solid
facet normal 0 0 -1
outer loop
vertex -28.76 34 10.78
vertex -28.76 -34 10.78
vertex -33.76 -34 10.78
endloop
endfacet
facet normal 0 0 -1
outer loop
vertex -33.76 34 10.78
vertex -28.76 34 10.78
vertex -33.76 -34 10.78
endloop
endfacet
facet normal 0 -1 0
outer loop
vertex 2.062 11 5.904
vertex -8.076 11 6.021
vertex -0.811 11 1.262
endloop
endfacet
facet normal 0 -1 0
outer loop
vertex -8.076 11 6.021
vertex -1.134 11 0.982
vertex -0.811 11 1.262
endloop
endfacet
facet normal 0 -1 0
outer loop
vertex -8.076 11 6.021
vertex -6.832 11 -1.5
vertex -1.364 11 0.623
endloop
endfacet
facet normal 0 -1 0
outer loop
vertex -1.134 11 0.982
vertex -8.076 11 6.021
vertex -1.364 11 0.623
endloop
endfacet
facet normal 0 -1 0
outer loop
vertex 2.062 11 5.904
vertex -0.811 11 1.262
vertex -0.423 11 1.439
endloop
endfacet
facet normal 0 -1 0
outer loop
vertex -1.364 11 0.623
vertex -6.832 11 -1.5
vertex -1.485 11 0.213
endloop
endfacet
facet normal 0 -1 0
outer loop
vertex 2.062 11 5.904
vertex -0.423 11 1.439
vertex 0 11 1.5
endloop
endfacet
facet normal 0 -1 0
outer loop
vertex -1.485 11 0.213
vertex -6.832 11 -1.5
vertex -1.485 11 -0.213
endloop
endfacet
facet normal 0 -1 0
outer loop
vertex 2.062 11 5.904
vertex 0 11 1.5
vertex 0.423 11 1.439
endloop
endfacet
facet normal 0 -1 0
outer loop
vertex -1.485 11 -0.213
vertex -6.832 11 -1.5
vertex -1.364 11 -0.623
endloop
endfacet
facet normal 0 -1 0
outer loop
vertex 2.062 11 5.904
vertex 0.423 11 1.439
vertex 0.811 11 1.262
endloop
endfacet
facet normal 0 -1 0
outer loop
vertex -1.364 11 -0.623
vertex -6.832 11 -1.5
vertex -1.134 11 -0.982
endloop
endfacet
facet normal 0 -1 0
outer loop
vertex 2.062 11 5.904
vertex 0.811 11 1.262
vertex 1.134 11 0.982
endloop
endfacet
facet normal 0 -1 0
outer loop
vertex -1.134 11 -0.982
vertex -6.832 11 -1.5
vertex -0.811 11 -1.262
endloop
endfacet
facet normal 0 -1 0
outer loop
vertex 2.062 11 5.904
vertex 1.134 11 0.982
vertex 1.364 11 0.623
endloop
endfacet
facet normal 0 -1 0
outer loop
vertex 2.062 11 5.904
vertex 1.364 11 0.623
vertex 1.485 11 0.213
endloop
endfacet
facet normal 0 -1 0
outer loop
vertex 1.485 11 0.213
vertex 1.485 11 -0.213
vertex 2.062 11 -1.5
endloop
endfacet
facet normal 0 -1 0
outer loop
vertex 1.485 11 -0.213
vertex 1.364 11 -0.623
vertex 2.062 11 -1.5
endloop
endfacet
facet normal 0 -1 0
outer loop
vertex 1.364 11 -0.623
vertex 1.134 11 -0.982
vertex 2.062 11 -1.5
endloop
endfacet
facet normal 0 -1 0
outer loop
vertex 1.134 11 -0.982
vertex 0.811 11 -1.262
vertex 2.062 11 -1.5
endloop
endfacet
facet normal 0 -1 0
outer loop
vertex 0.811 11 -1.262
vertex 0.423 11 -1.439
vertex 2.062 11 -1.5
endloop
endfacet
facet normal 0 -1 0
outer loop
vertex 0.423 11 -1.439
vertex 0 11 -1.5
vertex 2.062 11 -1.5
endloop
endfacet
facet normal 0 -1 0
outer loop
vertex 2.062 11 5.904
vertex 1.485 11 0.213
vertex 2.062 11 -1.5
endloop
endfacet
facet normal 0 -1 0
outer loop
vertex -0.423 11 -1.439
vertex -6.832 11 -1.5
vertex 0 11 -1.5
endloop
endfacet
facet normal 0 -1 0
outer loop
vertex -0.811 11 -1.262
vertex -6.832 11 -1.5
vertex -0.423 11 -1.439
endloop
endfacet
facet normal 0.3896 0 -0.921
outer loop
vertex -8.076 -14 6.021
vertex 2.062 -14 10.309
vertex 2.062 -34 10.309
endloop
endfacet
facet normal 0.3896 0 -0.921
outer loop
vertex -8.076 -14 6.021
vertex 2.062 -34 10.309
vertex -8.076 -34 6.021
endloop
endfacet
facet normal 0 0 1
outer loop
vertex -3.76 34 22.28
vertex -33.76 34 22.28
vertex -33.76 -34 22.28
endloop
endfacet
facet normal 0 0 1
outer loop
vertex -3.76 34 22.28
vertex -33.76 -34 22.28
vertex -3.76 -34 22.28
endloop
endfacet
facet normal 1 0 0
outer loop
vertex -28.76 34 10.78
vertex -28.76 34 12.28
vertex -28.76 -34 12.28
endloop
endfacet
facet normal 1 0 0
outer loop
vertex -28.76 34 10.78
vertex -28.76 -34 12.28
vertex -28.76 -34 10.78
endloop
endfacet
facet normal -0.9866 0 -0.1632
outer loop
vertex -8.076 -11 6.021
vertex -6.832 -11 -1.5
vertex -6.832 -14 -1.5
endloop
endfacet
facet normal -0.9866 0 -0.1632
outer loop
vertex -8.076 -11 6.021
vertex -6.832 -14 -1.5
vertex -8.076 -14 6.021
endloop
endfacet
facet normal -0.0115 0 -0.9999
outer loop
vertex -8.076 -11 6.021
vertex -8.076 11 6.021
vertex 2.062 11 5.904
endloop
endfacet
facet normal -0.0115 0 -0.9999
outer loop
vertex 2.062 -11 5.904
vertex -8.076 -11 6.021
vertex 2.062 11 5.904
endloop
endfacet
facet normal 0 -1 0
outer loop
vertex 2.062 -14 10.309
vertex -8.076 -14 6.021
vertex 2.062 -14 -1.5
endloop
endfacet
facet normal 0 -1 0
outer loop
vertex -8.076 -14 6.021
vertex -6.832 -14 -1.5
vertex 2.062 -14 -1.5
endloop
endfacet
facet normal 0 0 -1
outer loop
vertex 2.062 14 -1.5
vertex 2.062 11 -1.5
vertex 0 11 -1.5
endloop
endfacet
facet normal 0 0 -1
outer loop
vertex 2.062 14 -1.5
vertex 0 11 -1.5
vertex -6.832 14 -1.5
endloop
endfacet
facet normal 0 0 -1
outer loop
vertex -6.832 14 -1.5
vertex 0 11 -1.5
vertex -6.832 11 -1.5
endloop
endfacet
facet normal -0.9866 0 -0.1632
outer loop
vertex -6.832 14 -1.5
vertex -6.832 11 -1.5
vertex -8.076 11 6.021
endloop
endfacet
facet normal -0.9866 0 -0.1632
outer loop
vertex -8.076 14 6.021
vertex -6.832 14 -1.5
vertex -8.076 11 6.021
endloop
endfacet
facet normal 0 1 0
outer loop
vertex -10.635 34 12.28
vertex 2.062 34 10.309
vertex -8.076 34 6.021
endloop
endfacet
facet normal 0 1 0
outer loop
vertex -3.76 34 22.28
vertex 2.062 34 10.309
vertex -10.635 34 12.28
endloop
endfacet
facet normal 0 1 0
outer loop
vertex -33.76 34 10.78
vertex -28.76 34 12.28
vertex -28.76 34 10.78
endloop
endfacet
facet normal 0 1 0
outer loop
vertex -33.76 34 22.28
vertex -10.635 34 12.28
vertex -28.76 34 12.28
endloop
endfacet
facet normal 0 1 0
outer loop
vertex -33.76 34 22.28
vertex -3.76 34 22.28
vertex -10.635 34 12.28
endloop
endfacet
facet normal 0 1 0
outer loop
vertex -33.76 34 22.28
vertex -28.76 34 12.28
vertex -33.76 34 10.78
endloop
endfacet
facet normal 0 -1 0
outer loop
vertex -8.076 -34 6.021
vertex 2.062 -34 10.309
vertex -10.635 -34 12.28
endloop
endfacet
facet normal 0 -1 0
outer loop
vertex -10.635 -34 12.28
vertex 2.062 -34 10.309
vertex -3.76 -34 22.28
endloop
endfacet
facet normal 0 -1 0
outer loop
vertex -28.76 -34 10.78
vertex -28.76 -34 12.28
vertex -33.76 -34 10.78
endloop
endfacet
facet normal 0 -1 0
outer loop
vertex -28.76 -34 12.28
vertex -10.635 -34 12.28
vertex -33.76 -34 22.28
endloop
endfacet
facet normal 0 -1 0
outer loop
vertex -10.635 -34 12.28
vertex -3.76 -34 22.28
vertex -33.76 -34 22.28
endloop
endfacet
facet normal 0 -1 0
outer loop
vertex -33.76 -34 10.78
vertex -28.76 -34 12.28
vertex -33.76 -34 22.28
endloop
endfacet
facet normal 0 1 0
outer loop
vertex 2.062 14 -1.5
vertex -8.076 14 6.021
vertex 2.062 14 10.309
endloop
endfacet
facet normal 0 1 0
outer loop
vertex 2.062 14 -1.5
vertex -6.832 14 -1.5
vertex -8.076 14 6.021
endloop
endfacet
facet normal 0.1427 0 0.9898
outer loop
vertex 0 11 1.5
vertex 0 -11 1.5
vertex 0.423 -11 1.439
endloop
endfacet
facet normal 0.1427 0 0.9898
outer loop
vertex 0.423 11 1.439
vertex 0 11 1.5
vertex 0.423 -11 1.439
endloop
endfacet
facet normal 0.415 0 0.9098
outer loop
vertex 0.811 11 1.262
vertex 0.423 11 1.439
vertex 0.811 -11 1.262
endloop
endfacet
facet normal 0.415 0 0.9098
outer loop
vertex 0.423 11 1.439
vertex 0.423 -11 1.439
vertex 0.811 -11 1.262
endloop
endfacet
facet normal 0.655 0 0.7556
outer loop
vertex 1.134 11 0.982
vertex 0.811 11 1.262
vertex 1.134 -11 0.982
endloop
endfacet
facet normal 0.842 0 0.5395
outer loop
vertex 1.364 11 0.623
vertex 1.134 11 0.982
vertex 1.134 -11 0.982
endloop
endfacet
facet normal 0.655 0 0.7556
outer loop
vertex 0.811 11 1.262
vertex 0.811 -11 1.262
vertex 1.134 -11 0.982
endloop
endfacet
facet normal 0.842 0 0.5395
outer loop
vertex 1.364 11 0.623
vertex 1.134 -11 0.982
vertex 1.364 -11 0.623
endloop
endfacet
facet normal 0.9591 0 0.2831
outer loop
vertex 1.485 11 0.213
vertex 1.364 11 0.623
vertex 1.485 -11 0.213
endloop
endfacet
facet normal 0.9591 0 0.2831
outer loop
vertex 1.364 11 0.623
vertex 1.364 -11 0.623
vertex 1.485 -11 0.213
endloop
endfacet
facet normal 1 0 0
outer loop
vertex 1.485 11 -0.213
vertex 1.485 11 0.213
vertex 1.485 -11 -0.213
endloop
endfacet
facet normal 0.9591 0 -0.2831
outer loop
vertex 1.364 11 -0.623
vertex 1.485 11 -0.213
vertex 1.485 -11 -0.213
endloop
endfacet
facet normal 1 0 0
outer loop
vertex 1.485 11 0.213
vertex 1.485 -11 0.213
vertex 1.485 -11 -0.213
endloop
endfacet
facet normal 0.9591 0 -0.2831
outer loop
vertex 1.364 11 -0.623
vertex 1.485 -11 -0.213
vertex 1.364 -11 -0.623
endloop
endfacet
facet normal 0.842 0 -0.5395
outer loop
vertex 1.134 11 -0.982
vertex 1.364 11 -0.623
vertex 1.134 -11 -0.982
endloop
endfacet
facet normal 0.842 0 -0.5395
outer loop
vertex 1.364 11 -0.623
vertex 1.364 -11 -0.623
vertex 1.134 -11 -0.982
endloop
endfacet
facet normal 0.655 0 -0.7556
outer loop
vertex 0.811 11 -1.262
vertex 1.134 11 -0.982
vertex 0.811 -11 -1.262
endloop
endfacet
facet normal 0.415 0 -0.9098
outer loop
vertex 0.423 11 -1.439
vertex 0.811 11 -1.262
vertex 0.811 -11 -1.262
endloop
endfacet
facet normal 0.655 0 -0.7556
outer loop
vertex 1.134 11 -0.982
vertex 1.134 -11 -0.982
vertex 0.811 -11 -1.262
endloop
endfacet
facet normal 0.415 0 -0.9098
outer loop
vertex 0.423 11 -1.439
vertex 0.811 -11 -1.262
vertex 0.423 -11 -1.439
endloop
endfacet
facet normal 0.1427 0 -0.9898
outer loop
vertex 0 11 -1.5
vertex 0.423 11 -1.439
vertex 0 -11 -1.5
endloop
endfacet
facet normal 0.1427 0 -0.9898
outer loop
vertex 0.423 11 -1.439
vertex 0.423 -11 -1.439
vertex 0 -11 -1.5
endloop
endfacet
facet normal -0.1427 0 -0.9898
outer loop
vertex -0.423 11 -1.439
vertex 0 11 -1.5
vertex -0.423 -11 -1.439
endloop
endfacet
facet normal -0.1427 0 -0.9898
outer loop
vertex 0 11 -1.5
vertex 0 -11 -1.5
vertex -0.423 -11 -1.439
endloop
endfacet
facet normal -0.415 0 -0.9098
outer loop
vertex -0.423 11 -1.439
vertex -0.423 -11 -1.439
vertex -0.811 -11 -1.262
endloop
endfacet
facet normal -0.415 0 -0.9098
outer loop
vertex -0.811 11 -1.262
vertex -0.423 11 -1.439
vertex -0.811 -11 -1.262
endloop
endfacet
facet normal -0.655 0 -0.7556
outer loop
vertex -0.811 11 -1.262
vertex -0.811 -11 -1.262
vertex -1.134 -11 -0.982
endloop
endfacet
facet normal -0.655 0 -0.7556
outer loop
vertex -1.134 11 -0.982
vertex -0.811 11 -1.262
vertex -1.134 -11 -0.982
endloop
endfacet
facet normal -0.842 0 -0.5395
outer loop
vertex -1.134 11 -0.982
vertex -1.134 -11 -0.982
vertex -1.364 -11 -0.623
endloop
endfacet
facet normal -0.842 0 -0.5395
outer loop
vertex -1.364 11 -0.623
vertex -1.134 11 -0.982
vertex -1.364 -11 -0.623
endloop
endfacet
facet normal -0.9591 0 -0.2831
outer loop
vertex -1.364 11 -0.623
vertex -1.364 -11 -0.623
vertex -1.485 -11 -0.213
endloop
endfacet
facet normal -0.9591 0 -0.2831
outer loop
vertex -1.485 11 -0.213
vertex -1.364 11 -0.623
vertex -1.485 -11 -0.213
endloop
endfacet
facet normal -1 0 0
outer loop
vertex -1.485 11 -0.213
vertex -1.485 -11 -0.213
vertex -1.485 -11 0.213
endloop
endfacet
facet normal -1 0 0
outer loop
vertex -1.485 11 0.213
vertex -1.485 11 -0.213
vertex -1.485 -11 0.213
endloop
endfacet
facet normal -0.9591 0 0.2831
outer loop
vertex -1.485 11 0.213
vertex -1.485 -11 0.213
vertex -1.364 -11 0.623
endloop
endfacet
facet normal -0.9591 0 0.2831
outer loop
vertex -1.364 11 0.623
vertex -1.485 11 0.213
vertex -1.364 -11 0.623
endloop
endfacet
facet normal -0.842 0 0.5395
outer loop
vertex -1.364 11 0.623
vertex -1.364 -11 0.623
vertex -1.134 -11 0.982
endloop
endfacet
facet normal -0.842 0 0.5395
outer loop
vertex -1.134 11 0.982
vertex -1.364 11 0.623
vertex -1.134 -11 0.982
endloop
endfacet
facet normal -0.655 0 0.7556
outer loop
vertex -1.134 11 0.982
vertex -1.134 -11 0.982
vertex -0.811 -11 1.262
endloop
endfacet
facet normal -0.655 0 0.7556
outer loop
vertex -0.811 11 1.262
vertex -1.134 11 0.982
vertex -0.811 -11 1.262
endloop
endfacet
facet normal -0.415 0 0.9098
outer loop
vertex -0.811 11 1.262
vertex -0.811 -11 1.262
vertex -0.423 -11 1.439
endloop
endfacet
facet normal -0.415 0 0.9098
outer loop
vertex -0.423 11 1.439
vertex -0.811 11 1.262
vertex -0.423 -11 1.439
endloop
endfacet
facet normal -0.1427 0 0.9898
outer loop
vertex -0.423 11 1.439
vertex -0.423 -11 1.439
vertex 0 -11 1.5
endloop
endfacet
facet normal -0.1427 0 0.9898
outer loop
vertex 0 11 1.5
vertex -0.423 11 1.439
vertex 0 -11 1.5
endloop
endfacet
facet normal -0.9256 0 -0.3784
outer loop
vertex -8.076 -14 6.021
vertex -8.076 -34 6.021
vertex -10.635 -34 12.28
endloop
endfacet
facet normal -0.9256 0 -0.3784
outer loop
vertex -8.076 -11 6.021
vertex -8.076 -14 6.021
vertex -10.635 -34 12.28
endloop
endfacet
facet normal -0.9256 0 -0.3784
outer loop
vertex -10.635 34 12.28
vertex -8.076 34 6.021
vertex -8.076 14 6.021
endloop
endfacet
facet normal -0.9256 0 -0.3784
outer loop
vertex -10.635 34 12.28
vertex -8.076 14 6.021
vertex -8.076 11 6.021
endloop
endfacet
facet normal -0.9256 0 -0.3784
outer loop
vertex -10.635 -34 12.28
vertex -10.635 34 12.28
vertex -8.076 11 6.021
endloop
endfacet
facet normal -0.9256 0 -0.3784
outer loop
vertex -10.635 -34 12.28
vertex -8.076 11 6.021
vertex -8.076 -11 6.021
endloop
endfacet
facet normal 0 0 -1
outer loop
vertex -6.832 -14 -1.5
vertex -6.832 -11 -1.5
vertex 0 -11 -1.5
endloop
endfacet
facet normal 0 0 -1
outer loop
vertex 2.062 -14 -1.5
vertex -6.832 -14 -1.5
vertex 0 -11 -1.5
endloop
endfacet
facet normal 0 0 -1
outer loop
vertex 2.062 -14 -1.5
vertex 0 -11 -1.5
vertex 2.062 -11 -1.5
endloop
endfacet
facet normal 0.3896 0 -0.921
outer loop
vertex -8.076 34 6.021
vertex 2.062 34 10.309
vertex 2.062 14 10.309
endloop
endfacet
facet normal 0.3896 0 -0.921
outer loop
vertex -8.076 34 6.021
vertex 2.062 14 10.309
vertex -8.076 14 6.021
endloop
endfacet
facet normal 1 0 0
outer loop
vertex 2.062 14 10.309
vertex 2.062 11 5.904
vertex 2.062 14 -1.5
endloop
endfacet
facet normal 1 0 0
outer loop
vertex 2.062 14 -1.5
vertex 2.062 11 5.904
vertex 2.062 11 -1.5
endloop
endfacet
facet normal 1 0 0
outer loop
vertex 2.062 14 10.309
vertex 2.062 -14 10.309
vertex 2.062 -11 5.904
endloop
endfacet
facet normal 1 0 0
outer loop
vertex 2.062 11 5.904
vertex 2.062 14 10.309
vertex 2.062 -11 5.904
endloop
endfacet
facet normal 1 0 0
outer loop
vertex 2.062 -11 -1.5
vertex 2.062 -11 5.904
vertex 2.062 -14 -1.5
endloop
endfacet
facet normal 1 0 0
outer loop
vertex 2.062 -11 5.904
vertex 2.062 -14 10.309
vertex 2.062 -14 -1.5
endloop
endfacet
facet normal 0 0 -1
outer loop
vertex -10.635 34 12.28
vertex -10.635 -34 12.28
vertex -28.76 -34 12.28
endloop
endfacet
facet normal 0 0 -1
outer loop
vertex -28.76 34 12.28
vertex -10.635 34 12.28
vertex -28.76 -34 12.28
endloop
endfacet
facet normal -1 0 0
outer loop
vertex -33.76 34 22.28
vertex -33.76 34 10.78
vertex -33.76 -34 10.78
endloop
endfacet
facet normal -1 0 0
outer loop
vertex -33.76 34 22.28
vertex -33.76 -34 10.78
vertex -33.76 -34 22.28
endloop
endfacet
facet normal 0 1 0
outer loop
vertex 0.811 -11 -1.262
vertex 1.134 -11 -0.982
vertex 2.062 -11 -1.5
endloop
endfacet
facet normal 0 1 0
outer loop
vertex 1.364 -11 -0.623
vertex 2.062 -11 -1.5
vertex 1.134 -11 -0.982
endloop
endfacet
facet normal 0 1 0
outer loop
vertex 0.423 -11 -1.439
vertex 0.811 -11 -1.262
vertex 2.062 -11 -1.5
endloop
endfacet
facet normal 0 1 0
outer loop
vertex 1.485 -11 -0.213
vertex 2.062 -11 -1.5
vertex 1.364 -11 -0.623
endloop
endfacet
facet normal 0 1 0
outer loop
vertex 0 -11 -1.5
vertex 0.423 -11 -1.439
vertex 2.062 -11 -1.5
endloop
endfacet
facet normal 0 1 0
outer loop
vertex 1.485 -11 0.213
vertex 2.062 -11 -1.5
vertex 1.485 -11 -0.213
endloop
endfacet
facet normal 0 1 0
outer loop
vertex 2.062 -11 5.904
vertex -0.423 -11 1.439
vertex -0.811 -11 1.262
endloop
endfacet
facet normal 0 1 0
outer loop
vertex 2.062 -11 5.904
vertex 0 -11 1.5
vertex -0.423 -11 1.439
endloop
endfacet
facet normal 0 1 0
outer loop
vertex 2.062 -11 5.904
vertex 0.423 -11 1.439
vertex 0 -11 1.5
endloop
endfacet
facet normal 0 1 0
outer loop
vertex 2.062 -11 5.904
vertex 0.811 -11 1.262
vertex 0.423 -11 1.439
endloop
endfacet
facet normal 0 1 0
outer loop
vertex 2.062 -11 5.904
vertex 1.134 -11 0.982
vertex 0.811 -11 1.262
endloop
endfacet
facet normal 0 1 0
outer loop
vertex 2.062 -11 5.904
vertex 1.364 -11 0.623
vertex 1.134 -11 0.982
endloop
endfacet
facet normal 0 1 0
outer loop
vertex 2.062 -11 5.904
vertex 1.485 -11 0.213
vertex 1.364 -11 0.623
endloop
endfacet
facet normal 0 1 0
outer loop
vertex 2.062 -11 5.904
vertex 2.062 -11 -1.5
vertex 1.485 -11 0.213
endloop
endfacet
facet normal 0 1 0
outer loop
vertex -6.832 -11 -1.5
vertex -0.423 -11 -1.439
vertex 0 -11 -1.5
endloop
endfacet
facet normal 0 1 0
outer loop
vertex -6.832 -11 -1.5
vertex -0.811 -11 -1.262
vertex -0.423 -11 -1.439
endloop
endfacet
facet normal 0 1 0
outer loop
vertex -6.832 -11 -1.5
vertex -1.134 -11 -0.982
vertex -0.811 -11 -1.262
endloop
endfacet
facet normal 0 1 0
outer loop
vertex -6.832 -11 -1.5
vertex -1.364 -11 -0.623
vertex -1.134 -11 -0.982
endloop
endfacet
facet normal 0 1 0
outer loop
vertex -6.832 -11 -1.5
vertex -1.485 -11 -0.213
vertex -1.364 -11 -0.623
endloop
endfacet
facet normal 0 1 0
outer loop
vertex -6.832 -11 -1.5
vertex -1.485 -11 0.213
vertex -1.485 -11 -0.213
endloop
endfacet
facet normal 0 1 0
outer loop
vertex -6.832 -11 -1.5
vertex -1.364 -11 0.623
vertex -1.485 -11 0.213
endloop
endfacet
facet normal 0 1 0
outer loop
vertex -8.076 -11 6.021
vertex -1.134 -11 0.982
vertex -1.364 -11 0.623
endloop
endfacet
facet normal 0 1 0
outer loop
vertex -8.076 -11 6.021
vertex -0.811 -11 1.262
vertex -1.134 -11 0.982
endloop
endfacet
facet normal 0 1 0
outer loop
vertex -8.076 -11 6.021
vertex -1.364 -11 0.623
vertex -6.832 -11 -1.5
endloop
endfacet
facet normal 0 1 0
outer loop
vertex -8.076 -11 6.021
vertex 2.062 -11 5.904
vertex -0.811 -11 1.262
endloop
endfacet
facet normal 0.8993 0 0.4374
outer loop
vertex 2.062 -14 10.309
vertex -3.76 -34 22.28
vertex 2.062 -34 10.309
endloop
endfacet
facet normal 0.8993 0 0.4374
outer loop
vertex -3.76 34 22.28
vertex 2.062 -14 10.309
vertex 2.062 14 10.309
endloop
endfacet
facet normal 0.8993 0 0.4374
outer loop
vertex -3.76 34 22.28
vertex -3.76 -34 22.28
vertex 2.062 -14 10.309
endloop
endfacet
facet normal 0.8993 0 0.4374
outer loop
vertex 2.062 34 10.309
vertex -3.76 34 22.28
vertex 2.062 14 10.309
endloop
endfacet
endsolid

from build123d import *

# Parameters (mm, degrees)
BOSS_EXTRU_1_DEPTH      = 11
BOSS_EXTRU_1_DEPTH_BACK = 11
ESQUISSE1_R             = 1.5
BOSS_EXTRU_3_DEPTH      = 3
BOSS_EXTRU_3_DEPTH_BACK = 25
BOSS_EXTRU_4_DEPTH      = 3
BOSS_EXTRU_5_DEPTH      = 3
ESQUISSE5_W             = 5
ESQUISSE5_H             = 2
ENL_V_MAT_EXTRU_1_DEPTH = 39
ESQUISSE6_W             = 5
ESQUISSE6_H             = 1.5
BOSS_EXTRU_6_DEPTH      = 28
BOSS_EXTRU_7_DEPTH      = 20
BOSS_EXTRU_7_DEPTH_BACK = 48


with BuildPart() as part:
    # Esquisse1 → Boss.-Extru.1 (new, two sides: drawn at the far end of the back side and taken through both)
    with BuildSketch(Plane(origin=(0, 0, 0), x_dir=(1, 0, 0), z_dir=(0, 1, 0)).offset(-BOSS_EXTRU_1_DEPTH_BACK)):
        with Locations(Location((0, 0, 0), (0, 0, 270))):
            Circle(ESQUISSE1_R)
    extrude(amount=BOSS_EXTRU_1_DEPTH + BOSS_EXTRU_1_DEPTH_BACK)



with BuildPart() as body_2:
    # Esquisse2 → Boss.-Extru.3 (new, two sides: drawn at the far end of the back side and taken through both)
    with BuildSketch(Plane.XZ.offset(11).offset(-BOSS_EXTRU_3_DEPTH_BACK)):
        Polygon((2.061683226, 10.308952687), (-3.759613912, 22.279872949), (-33.759613912, 22.279872949), (-33.759613912, 12.279872949), (-28.759613912, 12.279872949), (-28.759613912, 10.279872949), (-23.759613912, 10.279872949), (-23.759613912, 12.279872949), (-10.635382522, 12.279872949), (-8.075859571, 6.021220419), (2.061683226, 5.904476344), align=None)
    extrude(amount=BOSS_EXTRU_3_DEPTH + BOSS_EXTRU_3_DEPTH_BACK)


with BuildPart() as part_1:
    add(part.part)

    add(body_2.part)  # Boss.-Extru.4 merges body 2
    # Esquisse3 → Boss.-Extru.4 (add)
    with BuildSketch(Plane.XZ.offset(11)):
        Polygon((0, -1.5), (-6.831858839, -1.5), (-8.075859571, 6.021220419), (2.061683226, 5.904476344), (2.061683226, -1.5), align=None)
    extrude(amount=BOSS_EXTRU_4_DEPTH)

    # Esquisse4 → Boss.-Extru.5 (add)
    with BuildSketch(Plane(origin=(0, 11, 0), x_dir=(1, 0, 0), z_dir=(0, 1, 0))):
        Polygon((2.061683226, 1.5), (-6.831858839, 1.5), (-8.075859571, -6.021220419), (2.061683226, -5.904476344), align=None)
    extrude(amount=BOSS_EXTRU_5_DEPTH)

    # Esquisse5 → Enlèv. mat.-Extru.1 (cut)
    with BuildSketch(Plane(origin=(0, 14, 0), x_dir=(1, 0, 0), z_dir=(0, 1, 0))):
        with Locations((-26.259613912, -11.279872949)):
            Rectangle(ESQUISSE5_W, ESQUISSE5_H)
    extrude(amount=-ENL_V_MAT_EXTRU_1_DEPTH, mode=Mode.SUBTRACT)

    # Esquisse6 → Boss.-Extru.6 (add)
    with BuildSketch(Plane(origin=(0, 14, 0), x_dir=(1, 0, 0), z_dir=(0, 1, 0))):
        with Locations((-31.259613912, -11.529872949)):
            Rectangle(ESQUISSE6_W, ESQUISSE6_H)
    extrude(amount=-BOSS_EXTRU_6_DEPTH)

    # Esquisse7 → Boss.-Extru.7 (add, two sides: drawn at the far end of the back side and taken through both)
    with BuildSketch(Plane.XZ.offset(14).offset(-BOSS_EXTRU_7_DEPTH_BACK)):
        Polygon((2.061683226, 10.308952687), (-8.075859571, 6.021220419), (-10.635382522, 12.279872949), (-28.759613912, 12.279872949), (-28.759613912, 10.779872949), (-33.759613912, 10.779872949), (-33.759613912, 22.279872949), (-3.759613912, 22.279872949), align=None)
    extrude(amount=BOSS_EXTRU_7_DEPTH + BOSS_EXTRU_7_DEPTH_BACK)


solid = part_1.part
